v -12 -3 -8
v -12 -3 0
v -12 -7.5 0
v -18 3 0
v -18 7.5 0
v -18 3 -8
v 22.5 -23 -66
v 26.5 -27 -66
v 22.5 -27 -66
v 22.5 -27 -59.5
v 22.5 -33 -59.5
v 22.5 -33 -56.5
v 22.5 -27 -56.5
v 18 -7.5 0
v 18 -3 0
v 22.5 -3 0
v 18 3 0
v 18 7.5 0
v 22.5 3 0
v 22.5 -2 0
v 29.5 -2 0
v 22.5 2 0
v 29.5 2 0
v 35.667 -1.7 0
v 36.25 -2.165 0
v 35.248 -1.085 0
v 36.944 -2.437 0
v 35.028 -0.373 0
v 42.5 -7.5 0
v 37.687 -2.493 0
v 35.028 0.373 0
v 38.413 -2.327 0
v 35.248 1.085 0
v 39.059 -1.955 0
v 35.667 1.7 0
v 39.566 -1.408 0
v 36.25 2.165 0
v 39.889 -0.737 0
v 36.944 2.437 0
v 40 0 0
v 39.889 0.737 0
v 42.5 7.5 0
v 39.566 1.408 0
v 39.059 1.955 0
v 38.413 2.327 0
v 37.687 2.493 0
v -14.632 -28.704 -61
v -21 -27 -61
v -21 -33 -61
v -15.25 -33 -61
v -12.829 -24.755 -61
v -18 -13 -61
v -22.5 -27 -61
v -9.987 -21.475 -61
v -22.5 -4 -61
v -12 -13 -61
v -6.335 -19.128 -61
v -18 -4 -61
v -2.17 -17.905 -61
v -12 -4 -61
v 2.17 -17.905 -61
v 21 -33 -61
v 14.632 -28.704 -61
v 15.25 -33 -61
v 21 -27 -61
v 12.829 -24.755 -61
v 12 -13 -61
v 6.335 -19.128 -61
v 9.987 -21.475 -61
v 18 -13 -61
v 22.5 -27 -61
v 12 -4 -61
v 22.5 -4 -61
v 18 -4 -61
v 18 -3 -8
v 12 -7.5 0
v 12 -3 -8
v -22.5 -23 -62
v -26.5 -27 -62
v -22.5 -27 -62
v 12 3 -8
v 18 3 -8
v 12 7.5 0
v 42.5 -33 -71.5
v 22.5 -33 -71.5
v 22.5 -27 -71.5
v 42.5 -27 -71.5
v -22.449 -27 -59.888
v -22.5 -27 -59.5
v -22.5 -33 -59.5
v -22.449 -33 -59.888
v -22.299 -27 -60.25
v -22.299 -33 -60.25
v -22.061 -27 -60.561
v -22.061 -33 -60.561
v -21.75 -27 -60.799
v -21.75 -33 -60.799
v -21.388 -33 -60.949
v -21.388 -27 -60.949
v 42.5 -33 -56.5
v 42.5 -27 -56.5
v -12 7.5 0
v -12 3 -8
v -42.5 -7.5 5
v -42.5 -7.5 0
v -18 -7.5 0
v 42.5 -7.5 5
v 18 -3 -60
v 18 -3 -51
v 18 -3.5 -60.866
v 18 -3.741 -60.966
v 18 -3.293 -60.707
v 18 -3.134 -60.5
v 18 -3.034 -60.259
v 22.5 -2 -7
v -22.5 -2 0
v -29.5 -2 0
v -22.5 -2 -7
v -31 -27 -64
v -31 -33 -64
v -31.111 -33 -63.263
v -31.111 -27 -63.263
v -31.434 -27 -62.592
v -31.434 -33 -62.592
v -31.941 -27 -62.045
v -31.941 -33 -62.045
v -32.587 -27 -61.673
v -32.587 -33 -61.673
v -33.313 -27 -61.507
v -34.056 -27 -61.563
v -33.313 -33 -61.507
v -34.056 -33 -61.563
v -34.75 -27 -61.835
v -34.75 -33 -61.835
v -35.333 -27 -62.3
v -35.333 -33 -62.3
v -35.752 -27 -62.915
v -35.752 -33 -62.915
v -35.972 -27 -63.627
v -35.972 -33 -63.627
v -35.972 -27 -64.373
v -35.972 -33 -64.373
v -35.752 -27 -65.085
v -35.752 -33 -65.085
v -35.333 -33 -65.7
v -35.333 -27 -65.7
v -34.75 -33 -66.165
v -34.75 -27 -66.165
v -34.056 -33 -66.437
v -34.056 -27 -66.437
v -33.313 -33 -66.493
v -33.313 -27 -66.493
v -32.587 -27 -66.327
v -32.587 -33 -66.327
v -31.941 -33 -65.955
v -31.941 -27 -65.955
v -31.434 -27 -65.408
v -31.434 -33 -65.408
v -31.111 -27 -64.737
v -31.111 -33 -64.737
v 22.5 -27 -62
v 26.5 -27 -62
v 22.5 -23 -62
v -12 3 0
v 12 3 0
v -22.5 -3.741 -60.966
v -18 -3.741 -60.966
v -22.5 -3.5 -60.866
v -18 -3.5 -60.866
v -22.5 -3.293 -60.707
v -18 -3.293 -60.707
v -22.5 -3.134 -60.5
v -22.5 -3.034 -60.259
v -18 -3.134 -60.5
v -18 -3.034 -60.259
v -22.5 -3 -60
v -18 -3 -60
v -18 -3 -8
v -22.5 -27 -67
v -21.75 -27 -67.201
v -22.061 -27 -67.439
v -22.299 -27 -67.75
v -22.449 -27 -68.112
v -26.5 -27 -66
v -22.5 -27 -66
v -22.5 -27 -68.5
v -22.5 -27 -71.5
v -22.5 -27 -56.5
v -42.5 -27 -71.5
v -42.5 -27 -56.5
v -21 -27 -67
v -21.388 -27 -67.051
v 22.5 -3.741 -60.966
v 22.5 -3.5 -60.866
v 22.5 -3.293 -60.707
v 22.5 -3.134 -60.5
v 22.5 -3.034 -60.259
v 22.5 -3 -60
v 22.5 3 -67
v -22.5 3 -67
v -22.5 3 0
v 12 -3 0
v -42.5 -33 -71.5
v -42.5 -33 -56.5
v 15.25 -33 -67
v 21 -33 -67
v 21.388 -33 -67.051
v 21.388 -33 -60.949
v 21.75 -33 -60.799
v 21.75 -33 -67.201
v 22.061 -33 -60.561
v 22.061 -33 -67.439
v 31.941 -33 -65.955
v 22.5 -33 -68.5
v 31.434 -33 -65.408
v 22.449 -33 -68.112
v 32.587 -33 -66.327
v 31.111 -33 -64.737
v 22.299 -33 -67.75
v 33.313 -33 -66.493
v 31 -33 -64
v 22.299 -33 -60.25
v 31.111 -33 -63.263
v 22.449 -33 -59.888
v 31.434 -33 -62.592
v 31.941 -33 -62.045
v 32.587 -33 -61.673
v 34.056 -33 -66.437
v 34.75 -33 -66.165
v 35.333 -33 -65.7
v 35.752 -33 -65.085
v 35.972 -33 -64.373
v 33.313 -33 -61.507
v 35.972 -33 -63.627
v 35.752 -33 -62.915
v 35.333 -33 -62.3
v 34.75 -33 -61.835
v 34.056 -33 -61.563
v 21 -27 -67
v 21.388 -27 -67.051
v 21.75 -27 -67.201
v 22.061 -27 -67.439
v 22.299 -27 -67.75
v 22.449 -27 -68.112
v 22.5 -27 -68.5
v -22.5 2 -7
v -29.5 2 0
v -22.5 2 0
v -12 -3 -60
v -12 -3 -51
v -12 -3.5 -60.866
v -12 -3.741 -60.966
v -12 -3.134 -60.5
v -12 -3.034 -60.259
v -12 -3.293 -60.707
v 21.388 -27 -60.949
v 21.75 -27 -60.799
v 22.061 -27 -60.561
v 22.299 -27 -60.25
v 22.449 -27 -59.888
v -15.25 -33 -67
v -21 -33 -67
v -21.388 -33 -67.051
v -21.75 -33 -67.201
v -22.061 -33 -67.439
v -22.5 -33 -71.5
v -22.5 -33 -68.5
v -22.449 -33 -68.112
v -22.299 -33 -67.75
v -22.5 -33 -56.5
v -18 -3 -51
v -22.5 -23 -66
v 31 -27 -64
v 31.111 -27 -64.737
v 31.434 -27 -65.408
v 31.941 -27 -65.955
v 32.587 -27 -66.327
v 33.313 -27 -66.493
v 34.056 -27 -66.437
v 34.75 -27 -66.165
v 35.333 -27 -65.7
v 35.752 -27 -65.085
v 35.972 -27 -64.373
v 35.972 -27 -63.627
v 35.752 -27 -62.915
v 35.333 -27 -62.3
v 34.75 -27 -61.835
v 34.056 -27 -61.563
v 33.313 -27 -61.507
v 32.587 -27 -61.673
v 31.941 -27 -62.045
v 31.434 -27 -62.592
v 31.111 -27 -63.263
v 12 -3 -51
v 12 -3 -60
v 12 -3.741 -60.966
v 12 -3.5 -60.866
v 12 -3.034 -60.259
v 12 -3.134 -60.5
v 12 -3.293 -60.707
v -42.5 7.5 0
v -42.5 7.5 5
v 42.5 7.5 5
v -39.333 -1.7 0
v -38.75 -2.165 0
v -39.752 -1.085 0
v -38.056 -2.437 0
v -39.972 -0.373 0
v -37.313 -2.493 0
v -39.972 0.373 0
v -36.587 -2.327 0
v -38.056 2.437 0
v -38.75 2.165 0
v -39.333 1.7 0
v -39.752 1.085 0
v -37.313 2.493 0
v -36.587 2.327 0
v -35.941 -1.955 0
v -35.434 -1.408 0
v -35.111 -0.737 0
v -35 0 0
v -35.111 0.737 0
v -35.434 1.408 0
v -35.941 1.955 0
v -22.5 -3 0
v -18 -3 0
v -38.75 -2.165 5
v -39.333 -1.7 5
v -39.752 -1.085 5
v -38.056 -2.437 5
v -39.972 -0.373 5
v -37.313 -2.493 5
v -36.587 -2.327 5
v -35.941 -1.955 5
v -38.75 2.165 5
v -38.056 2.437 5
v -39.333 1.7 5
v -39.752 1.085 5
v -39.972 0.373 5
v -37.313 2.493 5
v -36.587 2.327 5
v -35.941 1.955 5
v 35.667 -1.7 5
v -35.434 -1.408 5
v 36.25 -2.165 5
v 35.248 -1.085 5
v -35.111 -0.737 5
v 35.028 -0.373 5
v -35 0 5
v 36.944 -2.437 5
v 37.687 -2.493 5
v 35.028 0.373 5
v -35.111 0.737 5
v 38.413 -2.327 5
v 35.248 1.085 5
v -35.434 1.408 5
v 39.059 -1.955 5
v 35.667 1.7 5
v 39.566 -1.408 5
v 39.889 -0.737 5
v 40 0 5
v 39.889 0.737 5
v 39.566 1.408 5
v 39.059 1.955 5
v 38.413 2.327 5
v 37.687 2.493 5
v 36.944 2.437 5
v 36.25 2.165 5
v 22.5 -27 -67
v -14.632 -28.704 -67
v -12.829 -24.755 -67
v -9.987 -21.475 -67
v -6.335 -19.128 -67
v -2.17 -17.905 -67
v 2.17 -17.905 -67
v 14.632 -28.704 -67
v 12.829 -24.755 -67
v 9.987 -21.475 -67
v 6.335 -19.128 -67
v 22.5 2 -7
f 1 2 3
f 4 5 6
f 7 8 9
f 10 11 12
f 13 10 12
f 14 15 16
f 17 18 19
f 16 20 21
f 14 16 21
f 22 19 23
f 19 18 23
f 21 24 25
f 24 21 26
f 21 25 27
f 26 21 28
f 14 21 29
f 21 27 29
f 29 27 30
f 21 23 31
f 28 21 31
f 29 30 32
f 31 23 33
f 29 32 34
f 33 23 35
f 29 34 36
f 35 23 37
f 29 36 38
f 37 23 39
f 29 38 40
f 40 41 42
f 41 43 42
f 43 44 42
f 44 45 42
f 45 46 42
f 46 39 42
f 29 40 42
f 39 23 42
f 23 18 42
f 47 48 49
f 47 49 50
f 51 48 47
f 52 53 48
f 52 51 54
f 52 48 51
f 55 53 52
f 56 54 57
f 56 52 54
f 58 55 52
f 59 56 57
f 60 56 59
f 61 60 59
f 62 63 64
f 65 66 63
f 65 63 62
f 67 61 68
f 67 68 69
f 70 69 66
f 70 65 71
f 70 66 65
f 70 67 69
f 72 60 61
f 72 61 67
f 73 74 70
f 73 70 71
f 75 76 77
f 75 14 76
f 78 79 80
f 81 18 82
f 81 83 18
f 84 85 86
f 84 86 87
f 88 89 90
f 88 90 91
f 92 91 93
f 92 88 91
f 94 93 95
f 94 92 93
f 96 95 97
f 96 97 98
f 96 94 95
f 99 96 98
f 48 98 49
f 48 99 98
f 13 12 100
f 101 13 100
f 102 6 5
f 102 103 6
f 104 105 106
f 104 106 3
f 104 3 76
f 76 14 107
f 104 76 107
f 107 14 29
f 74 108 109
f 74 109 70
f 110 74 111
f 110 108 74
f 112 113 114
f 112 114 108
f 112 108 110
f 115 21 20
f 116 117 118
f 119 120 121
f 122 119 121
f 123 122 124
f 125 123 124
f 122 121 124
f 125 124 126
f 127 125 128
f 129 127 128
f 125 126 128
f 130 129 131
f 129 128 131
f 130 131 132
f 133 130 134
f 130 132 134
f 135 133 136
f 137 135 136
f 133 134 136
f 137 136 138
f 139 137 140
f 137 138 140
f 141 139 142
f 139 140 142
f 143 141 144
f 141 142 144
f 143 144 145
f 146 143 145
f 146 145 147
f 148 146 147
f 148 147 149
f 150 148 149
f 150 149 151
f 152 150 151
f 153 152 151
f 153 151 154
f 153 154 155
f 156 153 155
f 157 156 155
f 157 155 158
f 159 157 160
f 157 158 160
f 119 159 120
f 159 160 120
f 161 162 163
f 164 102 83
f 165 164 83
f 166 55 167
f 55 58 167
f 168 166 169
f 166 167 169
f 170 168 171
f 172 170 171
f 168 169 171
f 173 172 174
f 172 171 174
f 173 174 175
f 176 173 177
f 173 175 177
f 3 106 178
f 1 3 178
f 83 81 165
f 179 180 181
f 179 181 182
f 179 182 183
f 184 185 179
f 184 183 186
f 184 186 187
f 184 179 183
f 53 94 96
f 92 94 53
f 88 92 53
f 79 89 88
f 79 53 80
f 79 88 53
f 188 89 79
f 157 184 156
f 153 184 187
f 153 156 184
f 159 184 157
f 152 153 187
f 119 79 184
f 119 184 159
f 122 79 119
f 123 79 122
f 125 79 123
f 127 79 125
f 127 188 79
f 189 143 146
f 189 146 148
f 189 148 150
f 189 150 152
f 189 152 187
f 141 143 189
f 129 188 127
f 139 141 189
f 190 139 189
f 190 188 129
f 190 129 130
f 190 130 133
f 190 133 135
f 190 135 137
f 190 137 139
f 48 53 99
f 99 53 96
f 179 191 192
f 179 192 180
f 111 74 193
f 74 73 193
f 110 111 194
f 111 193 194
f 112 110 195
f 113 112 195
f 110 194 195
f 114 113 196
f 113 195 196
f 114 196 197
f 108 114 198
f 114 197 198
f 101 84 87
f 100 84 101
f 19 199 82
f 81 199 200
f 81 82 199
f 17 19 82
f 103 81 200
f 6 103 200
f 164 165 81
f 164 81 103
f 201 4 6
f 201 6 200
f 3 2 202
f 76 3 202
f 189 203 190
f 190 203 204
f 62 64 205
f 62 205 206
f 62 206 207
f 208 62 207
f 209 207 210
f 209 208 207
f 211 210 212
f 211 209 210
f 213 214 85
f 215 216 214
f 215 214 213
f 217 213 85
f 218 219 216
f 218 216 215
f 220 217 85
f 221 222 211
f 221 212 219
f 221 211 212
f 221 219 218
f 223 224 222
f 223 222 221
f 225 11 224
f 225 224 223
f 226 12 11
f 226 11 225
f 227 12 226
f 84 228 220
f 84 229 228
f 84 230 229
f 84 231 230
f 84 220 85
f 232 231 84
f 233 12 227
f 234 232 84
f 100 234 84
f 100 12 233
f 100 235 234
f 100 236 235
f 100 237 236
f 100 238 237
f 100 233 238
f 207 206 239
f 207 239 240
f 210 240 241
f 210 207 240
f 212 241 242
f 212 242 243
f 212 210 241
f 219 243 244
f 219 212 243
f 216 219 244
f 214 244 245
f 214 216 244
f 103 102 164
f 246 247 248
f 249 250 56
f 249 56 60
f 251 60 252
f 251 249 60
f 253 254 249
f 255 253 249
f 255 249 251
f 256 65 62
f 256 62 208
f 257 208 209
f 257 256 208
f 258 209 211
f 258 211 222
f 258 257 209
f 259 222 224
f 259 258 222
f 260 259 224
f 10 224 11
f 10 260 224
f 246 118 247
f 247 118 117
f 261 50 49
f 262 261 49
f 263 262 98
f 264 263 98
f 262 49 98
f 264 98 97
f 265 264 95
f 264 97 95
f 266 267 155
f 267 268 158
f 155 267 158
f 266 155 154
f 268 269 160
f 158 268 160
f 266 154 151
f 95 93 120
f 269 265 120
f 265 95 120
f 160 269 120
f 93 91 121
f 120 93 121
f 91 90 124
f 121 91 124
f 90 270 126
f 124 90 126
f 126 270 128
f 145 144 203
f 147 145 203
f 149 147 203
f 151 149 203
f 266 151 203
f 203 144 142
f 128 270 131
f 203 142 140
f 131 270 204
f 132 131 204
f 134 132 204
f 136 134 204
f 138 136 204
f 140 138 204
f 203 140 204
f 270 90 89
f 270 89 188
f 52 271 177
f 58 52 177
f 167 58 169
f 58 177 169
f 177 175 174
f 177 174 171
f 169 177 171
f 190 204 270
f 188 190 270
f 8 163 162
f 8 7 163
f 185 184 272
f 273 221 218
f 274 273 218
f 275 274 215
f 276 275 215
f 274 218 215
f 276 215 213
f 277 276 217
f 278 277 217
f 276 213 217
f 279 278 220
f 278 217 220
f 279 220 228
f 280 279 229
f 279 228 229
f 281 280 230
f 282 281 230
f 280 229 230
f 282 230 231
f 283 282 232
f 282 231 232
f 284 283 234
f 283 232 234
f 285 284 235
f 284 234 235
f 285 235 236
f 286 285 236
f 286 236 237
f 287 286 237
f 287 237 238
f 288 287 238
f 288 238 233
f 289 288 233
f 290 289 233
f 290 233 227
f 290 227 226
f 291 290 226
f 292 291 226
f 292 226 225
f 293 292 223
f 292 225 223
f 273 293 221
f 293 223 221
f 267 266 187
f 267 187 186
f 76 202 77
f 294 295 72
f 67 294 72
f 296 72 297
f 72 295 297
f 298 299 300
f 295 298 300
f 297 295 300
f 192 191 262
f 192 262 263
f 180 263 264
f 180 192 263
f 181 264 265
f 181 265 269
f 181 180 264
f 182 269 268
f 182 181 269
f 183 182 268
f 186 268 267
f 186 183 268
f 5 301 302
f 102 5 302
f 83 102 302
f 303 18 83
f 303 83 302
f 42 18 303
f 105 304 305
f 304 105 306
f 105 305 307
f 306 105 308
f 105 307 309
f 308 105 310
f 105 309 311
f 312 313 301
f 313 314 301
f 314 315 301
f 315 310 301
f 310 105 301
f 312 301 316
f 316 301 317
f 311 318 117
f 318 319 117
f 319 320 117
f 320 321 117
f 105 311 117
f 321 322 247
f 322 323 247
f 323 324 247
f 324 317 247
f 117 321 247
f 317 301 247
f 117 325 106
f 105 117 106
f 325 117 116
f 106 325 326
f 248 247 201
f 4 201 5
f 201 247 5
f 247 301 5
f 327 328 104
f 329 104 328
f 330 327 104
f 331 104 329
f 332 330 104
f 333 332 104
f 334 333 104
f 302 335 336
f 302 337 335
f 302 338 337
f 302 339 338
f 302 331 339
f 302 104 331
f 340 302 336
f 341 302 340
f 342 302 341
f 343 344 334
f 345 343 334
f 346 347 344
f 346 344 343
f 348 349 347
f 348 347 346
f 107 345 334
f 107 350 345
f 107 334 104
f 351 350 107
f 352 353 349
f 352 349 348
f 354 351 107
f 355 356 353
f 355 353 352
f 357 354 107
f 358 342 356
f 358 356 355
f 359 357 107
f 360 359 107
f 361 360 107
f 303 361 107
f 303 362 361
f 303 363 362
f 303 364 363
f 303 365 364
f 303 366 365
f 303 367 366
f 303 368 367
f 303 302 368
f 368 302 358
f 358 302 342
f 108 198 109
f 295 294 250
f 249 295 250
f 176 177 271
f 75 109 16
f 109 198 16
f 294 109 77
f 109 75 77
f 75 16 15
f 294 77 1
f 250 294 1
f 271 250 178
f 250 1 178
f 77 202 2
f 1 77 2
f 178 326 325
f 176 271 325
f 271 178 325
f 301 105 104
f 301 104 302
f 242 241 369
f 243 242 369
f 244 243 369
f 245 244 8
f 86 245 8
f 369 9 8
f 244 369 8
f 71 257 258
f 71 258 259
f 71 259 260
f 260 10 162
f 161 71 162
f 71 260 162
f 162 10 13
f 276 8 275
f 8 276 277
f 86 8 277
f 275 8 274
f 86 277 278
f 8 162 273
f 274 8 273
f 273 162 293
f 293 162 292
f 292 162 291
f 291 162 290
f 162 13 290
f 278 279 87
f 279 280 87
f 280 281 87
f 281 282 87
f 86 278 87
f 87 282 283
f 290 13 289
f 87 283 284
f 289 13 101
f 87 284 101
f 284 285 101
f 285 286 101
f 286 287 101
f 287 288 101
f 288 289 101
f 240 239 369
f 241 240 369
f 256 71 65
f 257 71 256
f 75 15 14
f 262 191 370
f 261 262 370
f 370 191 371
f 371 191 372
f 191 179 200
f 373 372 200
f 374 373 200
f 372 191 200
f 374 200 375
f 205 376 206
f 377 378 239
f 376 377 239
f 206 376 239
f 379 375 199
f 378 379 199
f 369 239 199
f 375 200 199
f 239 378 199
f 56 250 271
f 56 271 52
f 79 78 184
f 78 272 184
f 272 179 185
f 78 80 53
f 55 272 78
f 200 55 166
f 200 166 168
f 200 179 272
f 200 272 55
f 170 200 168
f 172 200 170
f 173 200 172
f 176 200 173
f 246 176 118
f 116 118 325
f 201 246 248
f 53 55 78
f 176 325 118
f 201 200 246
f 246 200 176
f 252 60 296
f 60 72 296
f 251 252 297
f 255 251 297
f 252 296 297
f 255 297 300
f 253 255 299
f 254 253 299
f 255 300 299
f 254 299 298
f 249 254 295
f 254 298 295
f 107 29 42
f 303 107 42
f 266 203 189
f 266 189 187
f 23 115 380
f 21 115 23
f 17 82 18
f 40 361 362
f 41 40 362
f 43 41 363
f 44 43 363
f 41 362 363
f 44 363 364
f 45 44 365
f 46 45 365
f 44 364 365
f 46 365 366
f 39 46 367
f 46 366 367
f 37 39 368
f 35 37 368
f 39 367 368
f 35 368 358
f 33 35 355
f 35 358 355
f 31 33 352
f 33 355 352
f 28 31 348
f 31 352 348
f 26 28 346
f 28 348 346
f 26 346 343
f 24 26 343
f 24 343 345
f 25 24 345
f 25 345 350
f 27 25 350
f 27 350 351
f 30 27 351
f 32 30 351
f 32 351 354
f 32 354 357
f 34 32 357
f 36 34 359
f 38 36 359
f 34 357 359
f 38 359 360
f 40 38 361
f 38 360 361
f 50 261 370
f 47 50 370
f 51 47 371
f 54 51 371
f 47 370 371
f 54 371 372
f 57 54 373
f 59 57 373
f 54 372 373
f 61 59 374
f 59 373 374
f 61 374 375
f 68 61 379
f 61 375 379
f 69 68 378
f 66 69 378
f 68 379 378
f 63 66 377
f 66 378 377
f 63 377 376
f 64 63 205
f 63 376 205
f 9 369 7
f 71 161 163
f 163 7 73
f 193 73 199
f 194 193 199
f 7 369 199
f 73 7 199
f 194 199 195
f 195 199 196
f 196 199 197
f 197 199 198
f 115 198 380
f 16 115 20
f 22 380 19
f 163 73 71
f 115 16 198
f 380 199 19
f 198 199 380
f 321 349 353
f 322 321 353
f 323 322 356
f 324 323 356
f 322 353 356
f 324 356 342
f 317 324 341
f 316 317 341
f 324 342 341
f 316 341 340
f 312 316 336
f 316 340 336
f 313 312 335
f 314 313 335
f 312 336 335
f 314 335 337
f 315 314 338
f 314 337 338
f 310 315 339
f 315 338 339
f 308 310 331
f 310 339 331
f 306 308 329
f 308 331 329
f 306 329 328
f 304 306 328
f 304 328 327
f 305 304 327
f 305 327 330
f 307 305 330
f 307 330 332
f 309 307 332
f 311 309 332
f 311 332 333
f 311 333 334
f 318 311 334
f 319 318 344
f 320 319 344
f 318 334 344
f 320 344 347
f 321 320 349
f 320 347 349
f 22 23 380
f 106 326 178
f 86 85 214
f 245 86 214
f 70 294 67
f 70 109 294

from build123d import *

# Parameters (mm, degrees)
SKETCH_1_W          = 85
SKETCH_1_H          = 15
EXTRUDE_1_DEPTH     = 5
SKETCH_2_R          = 2.5
CUT_EXTRUDE_1_DEPTH = 5
SKETCH_3_W          = 45
SKETCH_3_H          = 6
EXTRUDE_2_DEPTH     = 67
SKETCH_4_W          = 45
SKETCH_4_H          = 6
EXTRUDE_3_DEPTH     = 30
SKETCH_7_W          = 20
SKETCH_7_H          = 15
EXTRUDE_4_DEPTH     = 6
CUT_EXTRUDE_3_DEPTH = 6
EXTRUDE_5_DEPTH     = 3
EXTRUDE_6_DEPTH     = 3
FILLET_1_R          = 1
SKETCH_11_R         = 2.5
CUT_EXTRUDE_4_DEPTH = 6
FILLET_2_R          = 1.5
EXTRUDE_7_DEPTH     = 2
EXTRUDE_8_DEPTH     = 2
EXTRUDE_9_DEPTH     = 3
EXTRUDE_10_DEPTH    = 3


with BuildPart() as part:
    # 草图1 → 凸台-拉伸1 (new body)
    with BuildSketch(Plane.XY):
        Rectangle(SKETCH_1_W, SKETCH_1_H)
    extrude(amount=EXTRUDE_1_DEPTH)

    # 草图2 → 切除-拉伸1 (cut)
    with BuildSketch(Plane.XY.offset(5)):
        with Locations((-37.5, 0)):
            Circle(SKETCH_2_R)
        with Locations((37.5, 0)):
            Circle(SKETCH_2_R)
    extrude(amount=-CUT_EXTRUDE_1_DEPTH, mode=Mode.SUBTRACT)

    # 草图3 → 凸台-拉伸2 (add)
    with BuildSketch(Plane(origin=(0, 0, 0), x_dir=(-1, 0, 0), z_dir=(0, 0, -1))):
        Rectangle(SKETCH_3_W, SKETCH_3_H)
    extrude(amount=EXTRUDE_2_DEPTH)

    # 草图4 → 凸台-拉伸3 (add)
    with BuildSketch(Plane.XZ.offset(3)):
        with Locations((0, -64)):
            Rectangle(SKETCH_4_W, SKETCH_4_H)
    extrude(amount=EXTRUDE_3_DEPTH)

    # 草图7 → 凸台-拉伸4 (add)
    with BuildSketch(Plane.XZ.offset(33)):
        with Locations((32.5, -64)):
            Rectangle(SKETCH_7_W, SKETCH_7_H)
        with Locations((-32.5, -64)):
            Rectangle(SKETCH_7_W, SKETCH_7_H)
    extrude(amount=-EXTRUDE_4_DEPTH)

    # 草图5 → 切除-拉伸3 (cut)
    with BuildSketch(Plane(origin=(0, 0, -67), x_dir=(-1, 0, 0), z_dir=(0, 0, -1))):
        with BuildLine():
            Line((-15.25, -33), (15.25, -33))
            ThreePointArc((15.25, -33), (0, -17.75), (-15.25, -33))
        make_face()
    extrude(amount=-CUT_EXTRUDE_3_DEPTH, mode=Mode.SUBTRACT)

    # 草图8 → 凸台-拉伸5 (add, symmetric)
    with BuildSketch(Plane(origin=(15, 0, 0), x_dir=(0, 0, -1), z_dir=(1, 0, 0))):
        Polygon((51, -3), (61, -13), (61, -3), align=None)
    extrude(amount=EXTRUDE_5_DEPTH, both=True)

    # 草图10 → 凸台-拉伸6 (add, symmetric)
    with BuildSketch(Plane(origin=(-15, 0, 0), x_dir=(0, 0, -1), z_dir=(1, 0, 0))):
        Polygon((61, -3), (51, -3), (61, -13), align=None)
    extrude(amount=EXTRUDE_6_DEPTH, both=True)

    # 圆角1
    fillet_1_edges = [part.edges().sort_by_distance(p)[0] for p in [
        (-20.25, -3, -61),
        (20.25, -3, -61),
        (0, -3, -61),
    ]]
    fillet(fillet_1_edges, radius=FILLET_1_R)

    # 草图11 → 切除-拉伸4 (cut)
    with BuildSketch(Plane.XZ.offset(33)):
        with Locations((-33.5, -64)):
            Circle(SKETCH_11_R)
        with Locations(Location((33.5, -64, 0), (0, 0, 180))):
            Circle(SKETCH_11_R)
    extrude(amount=-CUT_EXTRUDE_4_DEPTH, mode=Mode.SUBTRACT)

    # 圆角2
    # the kernel refuses this fillet: 1.5 mm, written as the material it adds along each edge
    with BuildSketch(Plane(origin=(-22.5, -27, -67), x_dir=(1, 0, 0), z_dir=(0, -1, 0)), Plane(origin=(22.5, -27, -61), x_dir=(-1, 0, 0), z_dir=(0, -1, 0)), Plane(origin=(22.5, -33, -67), x_dir=(-1, 0, 0), z_dir=(0, 1, 0))) as fillet_2_piece_1:
        with BuildLine():
            CenterArc((FILLET_2_R, -FILLET_2_R), FILLET_2_R, 90, 90)
            Line((0, -FILLET_2_R), (0, 0))
            Line((0, 0), (FILLET_2_R, 0))
        make_face()
    extrude(amount=6)
    with BuildSketch(Plane(origin=(-22.5, -27, -61), x_dir=(1, 0, 0), z_dir=(0, -1, 0))) as fillet_2_piece_2:
        with BuildLine():
            CenterArc((FILLET_2_R, FILLET_2_R), FILLET_2_R, 180, 90)
            Line((0, FILLET_2_R), (0, 0))
            Line((0, 0), (FILLET_2_R, 0))
        make_face()
    extrude(amount=6)

    # 草图12 → 凸台-拉伸7 (add, symmetric)
    with BuildSketch(Plane(origin=(0, 0, -64), x_dir=(-1, 0, 0), z_dir=(0, 0, -1))):
        Polygon((-22.5, -23), (-26.5, -27), (-22.5, -27), align=None)
    extrude_7 = extrude(amount=EXTRUDE_7_DEPTH, both=True)

    # 镜向1: 凸台-拉伸7 across plane
    add(extrude_7.mirror(Plane(origin=(0, 0, 0), x_dir=(0, 0, 1), z_dir=(1, 0, 0))))

    # 草图13 → 凸台-拉伸8 (add, symmetric)
    with BuildSketch(Plane(origin=(0, 0, 0), x_dir=(-1, 0, 0), z_dir=(0, -1, 0))):
        Polygon((-22.5, 7), (-29.5, 0), (-22.5, 0), align=None)
    extrude_8 = extrude(amount=EXTRUDE_8_DEPTH, both=True)

    # 镜向2: 凸台-拉伸8 across plane
    add(extrude_8.mirror(Plane(origin=(0, 0, 0), x_dir=(0, 0, 1), z_dir=(1, 0, 0))))

    # 草图14 → 凸台-拉伸9 (add, symmetric)
    with BuildSketch(Plane(origin=(15, 0, 0), x_dir=(0, 0, -1), z_dir=(1, 0, 0))):
        Polygon((0, 7.5), (8, 3), (0, 3), align=None)
        Polygon((8, -3), (0, -3), (0, -7.5), align=None)
    extrude(amount=EXTRUDE_9_DEPTH, both=True)

    # 草图15 → 凸台-拉伸10 (add, symmetric)
    with BuildSketch(Plane(origin=(-15, 0, 0), x_dir=(0, 0, -1), z_dir=(1, 0, 0))):
        Polygon((0, -7.5), (8, -3), (0, -3), align=None)
        Polygon((0, 7.5), (0, 3), (8, 3), align=None)
    extrude(amount=EXTRUDE_10_DEPTH, both=True)


solid = part.part
